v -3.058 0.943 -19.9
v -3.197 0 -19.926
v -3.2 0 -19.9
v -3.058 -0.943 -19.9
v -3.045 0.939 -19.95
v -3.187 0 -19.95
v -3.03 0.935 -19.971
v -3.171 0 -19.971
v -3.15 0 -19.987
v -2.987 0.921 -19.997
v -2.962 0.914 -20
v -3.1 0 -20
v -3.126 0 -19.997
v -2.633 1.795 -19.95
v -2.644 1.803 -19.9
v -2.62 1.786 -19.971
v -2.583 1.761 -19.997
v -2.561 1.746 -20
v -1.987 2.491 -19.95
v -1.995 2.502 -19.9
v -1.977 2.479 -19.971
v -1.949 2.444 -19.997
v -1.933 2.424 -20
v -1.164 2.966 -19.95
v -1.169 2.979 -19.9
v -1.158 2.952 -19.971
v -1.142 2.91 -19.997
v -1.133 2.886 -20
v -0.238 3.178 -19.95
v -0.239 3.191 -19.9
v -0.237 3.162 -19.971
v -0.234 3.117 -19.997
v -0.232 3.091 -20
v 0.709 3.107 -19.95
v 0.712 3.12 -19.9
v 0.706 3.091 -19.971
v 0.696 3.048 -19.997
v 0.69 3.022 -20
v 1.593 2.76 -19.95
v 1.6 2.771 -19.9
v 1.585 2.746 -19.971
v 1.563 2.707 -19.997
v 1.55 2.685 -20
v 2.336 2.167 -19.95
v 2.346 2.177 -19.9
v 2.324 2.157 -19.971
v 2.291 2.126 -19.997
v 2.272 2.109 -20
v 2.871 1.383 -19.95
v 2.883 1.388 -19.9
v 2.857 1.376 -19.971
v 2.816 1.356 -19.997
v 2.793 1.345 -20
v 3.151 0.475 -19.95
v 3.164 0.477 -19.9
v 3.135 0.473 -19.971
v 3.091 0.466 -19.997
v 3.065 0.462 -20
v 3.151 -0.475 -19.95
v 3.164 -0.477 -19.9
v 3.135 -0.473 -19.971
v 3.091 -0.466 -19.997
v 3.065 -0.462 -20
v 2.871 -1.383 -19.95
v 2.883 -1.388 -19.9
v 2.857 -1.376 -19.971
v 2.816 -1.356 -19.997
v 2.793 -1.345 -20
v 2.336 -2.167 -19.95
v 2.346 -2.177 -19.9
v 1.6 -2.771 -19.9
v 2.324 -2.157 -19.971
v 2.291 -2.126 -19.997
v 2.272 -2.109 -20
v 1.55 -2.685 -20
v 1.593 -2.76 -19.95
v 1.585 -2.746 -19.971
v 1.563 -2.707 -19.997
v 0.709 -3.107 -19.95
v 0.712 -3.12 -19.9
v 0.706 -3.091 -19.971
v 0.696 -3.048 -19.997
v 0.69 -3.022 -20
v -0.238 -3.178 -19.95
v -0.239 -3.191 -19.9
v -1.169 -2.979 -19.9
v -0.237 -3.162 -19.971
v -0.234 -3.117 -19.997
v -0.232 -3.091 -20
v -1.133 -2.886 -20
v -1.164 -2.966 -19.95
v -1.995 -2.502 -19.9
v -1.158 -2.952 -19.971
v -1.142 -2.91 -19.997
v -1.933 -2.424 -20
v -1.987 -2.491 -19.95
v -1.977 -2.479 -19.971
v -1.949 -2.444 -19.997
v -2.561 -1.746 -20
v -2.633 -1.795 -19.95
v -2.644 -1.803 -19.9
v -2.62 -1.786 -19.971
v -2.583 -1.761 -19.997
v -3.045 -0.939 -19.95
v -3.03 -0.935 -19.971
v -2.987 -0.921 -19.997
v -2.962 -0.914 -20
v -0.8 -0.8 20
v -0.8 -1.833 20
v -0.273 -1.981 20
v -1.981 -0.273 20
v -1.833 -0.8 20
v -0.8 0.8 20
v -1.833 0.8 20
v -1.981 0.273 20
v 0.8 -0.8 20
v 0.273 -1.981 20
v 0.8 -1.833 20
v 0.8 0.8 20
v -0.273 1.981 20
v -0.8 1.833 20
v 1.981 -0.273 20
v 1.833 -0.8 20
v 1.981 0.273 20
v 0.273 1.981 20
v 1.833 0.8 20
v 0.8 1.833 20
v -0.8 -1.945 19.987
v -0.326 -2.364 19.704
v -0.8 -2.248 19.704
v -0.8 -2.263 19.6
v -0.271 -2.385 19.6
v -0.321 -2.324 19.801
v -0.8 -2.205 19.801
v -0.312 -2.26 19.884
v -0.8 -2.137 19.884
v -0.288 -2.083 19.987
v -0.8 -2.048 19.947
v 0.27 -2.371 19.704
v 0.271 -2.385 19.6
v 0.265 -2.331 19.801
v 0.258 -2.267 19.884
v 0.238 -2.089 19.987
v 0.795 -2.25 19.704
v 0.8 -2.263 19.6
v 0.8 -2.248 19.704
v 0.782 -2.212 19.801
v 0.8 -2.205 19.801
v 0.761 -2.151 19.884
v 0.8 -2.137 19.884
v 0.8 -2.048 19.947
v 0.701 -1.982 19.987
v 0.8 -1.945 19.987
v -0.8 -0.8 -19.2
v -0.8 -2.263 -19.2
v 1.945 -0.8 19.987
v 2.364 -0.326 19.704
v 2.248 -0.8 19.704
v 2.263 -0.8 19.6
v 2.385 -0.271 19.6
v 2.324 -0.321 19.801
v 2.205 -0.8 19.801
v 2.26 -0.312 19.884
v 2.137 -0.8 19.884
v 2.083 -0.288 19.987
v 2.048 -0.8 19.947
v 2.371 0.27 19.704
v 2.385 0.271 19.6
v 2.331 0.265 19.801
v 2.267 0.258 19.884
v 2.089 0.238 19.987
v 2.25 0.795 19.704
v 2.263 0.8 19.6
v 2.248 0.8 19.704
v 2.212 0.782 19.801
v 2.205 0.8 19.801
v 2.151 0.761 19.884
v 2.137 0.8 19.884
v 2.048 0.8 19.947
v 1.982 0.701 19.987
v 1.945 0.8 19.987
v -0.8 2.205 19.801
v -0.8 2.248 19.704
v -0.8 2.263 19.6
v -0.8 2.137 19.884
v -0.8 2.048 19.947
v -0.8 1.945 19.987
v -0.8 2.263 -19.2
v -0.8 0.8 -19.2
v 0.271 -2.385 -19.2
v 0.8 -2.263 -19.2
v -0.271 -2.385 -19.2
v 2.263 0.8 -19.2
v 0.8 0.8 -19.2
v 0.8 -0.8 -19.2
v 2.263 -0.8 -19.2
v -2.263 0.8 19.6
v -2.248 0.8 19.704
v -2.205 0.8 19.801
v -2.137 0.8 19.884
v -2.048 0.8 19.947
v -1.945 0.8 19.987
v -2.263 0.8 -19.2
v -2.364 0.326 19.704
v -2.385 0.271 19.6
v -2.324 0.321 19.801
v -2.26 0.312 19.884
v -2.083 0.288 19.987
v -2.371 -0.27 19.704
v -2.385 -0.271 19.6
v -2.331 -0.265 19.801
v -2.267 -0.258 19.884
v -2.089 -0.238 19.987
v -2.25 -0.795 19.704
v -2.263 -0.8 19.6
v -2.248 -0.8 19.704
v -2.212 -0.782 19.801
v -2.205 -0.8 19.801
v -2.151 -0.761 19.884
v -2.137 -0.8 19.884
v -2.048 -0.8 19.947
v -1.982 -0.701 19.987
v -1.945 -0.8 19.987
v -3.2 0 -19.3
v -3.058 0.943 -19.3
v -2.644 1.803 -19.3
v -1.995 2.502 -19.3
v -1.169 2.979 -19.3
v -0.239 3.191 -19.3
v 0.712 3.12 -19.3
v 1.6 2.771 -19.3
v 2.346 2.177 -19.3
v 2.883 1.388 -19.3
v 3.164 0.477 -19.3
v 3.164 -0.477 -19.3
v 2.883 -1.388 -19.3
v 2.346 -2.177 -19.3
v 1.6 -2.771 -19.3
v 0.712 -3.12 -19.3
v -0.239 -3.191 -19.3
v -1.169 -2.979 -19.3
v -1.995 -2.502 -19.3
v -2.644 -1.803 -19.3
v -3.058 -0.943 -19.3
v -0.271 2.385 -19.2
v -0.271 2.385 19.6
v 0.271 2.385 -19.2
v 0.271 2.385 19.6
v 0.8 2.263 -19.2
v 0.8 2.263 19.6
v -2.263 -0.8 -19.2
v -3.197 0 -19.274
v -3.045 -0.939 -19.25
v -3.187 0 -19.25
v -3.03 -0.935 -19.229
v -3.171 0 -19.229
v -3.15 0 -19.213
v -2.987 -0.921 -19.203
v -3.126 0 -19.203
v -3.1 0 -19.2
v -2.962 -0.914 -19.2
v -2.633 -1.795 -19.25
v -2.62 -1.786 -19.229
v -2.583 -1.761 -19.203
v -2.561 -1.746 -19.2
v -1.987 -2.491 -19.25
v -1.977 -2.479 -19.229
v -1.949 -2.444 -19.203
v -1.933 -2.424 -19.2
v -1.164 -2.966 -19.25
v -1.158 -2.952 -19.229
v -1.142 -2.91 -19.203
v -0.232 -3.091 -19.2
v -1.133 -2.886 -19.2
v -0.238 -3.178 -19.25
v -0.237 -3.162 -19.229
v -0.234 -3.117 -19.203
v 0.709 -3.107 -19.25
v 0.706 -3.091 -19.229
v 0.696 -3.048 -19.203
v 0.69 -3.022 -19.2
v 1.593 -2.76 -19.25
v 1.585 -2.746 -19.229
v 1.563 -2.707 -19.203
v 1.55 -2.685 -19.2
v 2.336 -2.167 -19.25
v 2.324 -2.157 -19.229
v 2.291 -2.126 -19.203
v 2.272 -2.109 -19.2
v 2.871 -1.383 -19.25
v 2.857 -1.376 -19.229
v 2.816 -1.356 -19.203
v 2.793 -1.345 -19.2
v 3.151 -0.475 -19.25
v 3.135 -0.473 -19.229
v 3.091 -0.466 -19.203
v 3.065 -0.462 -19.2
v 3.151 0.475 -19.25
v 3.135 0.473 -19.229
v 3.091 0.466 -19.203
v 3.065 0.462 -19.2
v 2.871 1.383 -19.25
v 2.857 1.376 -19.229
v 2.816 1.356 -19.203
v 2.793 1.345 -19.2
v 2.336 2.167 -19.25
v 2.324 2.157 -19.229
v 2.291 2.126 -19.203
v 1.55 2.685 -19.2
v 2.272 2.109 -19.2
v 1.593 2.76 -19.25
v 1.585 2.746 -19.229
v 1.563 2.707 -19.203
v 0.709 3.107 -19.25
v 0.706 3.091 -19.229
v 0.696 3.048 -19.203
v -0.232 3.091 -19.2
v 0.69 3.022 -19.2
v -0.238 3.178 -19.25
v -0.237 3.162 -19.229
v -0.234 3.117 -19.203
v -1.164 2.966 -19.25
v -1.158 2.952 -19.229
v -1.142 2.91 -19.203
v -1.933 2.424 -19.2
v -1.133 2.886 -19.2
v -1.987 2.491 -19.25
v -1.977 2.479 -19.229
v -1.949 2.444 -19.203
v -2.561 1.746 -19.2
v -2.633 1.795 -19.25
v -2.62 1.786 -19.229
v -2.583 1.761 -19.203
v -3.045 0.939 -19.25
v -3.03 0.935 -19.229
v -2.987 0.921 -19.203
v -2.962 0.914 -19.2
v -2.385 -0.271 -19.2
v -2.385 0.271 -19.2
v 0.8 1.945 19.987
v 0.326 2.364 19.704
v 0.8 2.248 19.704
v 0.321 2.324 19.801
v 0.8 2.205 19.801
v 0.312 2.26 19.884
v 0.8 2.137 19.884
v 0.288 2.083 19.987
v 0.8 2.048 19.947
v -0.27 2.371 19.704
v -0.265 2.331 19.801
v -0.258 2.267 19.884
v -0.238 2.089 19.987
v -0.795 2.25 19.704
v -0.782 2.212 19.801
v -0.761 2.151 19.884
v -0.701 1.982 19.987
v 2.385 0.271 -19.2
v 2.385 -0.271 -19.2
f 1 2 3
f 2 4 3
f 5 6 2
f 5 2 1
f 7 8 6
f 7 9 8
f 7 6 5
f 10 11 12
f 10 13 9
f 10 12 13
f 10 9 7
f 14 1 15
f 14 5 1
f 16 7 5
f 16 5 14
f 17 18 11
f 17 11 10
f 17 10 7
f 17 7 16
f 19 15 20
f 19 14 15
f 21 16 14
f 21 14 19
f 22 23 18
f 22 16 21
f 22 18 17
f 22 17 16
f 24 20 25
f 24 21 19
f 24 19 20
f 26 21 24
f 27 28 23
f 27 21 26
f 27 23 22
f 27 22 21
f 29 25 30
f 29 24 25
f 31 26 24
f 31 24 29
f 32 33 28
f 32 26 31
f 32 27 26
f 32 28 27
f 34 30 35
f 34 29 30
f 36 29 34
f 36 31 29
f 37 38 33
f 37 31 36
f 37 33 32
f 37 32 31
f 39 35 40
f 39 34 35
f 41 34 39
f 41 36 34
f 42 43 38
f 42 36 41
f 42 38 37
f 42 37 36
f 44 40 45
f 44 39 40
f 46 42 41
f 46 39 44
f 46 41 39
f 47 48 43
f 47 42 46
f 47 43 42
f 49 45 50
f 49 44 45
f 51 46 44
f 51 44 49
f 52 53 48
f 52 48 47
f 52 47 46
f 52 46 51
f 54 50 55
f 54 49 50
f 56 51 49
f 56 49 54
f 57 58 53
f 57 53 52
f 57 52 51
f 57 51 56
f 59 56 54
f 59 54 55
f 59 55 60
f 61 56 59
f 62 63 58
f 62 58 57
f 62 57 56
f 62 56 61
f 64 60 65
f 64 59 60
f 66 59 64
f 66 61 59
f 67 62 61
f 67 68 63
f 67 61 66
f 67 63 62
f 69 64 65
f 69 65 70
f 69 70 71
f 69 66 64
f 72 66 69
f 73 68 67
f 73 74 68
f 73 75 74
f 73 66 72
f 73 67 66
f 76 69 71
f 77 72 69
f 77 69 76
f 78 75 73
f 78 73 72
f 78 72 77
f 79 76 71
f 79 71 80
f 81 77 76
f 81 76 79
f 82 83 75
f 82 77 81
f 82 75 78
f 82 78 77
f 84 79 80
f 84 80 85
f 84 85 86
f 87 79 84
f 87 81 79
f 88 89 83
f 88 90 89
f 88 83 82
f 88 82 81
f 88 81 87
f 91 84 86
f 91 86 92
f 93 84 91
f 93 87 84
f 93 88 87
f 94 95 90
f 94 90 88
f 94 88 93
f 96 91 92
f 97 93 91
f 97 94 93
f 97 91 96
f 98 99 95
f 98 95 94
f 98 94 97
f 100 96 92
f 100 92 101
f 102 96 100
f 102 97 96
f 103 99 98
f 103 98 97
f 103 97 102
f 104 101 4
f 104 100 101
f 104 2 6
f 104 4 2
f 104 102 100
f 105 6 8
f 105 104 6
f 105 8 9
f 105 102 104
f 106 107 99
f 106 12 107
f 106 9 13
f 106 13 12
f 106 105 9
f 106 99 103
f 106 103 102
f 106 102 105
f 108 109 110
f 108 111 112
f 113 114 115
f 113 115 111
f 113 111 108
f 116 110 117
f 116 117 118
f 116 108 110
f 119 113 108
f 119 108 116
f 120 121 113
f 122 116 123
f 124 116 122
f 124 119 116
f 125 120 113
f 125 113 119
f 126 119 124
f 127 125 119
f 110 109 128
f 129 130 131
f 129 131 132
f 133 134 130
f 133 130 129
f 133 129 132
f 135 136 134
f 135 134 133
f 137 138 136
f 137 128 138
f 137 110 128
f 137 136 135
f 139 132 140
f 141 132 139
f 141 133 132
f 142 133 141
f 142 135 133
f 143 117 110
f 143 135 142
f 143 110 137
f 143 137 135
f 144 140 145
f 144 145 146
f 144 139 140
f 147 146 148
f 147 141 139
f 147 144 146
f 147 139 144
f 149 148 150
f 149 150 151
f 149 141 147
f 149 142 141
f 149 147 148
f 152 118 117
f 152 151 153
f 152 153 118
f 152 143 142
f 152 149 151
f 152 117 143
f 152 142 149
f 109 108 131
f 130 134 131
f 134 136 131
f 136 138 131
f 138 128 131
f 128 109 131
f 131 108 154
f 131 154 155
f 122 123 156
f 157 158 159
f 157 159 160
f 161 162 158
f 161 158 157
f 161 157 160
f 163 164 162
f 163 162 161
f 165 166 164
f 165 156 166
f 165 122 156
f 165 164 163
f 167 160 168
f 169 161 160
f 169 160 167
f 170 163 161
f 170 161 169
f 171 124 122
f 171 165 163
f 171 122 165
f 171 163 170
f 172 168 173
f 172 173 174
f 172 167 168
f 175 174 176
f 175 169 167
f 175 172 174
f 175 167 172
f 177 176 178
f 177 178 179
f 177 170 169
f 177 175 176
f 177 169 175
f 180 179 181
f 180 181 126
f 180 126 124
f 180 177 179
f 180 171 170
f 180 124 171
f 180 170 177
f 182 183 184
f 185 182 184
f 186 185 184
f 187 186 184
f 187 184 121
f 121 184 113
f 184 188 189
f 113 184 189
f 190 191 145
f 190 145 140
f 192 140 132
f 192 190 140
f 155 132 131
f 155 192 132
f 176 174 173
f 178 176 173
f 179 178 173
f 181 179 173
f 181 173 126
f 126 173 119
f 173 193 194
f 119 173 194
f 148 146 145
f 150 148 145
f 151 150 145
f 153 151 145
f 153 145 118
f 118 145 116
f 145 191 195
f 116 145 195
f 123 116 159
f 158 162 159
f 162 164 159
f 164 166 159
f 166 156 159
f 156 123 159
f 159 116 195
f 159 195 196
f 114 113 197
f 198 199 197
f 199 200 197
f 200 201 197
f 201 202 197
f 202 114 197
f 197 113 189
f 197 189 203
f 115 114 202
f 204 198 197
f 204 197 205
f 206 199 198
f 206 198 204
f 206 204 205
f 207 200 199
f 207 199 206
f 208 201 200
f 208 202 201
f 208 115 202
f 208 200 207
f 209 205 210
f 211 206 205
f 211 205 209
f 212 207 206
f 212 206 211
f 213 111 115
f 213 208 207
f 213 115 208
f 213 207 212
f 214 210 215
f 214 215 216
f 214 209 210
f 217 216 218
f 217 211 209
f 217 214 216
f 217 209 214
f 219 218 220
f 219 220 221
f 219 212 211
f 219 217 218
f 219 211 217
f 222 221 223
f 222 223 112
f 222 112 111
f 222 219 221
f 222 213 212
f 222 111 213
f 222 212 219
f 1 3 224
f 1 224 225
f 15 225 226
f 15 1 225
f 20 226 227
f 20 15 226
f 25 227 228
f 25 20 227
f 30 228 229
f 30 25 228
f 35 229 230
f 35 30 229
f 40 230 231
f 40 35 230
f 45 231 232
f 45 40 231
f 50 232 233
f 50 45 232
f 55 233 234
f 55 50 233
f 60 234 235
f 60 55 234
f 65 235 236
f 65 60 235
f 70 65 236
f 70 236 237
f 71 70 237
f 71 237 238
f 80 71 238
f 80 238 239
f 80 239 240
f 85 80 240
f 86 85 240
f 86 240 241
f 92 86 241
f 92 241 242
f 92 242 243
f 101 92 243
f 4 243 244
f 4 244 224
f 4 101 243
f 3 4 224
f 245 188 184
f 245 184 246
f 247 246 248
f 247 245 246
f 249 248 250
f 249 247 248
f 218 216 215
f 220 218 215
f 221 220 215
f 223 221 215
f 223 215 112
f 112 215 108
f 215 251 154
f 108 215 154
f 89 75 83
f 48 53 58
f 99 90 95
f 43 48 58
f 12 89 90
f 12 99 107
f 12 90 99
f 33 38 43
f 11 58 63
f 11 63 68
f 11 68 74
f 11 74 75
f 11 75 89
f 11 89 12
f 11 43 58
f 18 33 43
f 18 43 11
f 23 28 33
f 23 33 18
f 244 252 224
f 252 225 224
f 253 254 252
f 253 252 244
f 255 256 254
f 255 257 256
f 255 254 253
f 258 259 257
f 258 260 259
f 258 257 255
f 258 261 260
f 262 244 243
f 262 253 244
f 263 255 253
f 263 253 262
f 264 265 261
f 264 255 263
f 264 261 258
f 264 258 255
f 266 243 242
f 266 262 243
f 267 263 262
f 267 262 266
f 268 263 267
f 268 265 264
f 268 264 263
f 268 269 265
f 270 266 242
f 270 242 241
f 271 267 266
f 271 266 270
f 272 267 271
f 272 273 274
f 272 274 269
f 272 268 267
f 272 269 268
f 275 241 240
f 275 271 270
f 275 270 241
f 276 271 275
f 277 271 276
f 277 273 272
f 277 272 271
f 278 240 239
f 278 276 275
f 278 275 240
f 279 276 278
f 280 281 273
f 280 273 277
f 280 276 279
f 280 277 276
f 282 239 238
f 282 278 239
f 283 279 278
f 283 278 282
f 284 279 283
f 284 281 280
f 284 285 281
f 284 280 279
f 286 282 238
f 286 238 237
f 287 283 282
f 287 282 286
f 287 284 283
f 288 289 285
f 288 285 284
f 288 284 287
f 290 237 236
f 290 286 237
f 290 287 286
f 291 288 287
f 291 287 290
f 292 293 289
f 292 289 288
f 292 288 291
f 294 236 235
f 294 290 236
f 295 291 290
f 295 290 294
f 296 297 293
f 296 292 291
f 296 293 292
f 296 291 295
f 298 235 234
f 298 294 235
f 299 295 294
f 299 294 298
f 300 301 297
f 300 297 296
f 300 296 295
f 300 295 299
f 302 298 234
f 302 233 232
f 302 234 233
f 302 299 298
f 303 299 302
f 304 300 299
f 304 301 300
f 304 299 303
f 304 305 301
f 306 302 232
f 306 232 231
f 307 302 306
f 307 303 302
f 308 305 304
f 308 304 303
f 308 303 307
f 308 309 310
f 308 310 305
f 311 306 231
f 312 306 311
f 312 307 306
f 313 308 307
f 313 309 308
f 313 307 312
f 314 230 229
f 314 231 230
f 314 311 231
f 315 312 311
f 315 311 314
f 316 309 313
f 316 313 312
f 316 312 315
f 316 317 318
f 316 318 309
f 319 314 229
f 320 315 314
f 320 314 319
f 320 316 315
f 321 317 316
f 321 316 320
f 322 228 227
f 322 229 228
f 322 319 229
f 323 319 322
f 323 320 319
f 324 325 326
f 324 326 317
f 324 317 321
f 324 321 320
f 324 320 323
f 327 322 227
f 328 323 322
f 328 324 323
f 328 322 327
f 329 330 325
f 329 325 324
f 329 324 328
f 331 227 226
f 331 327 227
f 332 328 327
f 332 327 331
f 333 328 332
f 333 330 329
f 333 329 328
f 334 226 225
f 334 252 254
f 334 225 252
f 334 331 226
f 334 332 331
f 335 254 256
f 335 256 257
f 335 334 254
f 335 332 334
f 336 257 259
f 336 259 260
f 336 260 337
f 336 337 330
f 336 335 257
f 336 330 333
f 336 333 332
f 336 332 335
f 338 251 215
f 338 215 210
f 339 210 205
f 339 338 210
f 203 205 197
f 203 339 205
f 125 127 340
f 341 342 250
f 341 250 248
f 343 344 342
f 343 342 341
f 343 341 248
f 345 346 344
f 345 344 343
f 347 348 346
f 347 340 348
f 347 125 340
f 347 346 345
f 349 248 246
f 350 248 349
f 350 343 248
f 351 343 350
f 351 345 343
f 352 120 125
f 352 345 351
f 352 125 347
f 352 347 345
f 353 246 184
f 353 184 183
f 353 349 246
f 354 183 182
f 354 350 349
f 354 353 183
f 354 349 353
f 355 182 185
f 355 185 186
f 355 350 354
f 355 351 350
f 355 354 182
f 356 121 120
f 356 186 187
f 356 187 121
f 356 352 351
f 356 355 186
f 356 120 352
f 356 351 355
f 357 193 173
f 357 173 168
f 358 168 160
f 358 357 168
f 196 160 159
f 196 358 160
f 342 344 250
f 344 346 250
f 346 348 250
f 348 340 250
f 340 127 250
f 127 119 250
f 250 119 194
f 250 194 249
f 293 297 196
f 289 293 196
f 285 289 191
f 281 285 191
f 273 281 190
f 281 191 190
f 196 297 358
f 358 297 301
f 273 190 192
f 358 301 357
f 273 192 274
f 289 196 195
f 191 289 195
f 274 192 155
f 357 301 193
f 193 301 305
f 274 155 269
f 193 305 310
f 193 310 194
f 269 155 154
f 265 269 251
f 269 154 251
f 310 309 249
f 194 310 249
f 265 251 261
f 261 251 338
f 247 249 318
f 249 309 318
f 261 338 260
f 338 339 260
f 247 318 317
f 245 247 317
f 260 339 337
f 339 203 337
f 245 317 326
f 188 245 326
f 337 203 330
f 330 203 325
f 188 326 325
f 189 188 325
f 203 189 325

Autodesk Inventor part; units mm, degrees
ref_plane "YZ Plane" through (0, 0, 0) normal (1, 0, 0) x (0, 1, 0)
ref_plane "XZ Plane" through (0, 0, 0) normal (0, 1, 0) x (-1, 0, 0)
ref_plane "XY Plane" through (0, 0, 0) normal (0, 0, 1) x (1, 0, 0)
sketch "Sketch1" plane through (0, 0, 0) normal (0, 0, 1) x (1, 0, 0)
  circle A0 centre (0, 0) radius 2.4 construction
  line L0 (-0.8, 2.2627) -> (-0.8, 0.8)
  line L1 (-0.8, 0.8) -> (-2.2627, 0.8)
  line L2 (-2.2627, -0.8) -> (-0.8, -0.8)
  line L3 (-0.8, -0.8) -> (-0.8, -2.2627)
  line L4 (0.8, -2.2627) -> (0.8, -0.8)
  line L5 (0.8, -0.8) -> (2.2627, -0.8)
  line L6 (2.2627, 0.8) -> (0.8, 0.8)
  line L7 (0.8, 0.8) -> (0.8, 2.2627)
  arc A1 (0.8, 2.2627) -> (-0.8, 2.2627) centre (0, 0) ccw
  arc A2 (-2.2627, 0.8) -> (-2.2627, -0.8) centre (0, 0) ccw
  arc A3 (-0.8, -2.2627) -> (0.8, -2.2627) centre (0, 0) ccw
  arc A4 (2.2627, -0.8) -> (2.2627, 0.8) centre (0, 0) ccw
  dimension "d0" = 4.8
  dimension "d1" = 1.6
extrude "Extrusion1" add sketch "Sketch1" along normal mid plane 40
sketch "Sketch2" plane through (0, 0, -20) normal (0, 0, -1) x (-1, 0, 0)
  line L0 (0.8, 0.8) -> (0.8, 2.2627) projected
  arc A0 (0.8, 2.2627) -> (-0.8, 2.2627) centre (0, 0) ccw projected
  line L1 (-0.8, 2.2627) -> (-0.8, 0.8) projected
  line L2 (-0.8, 0.8) -> (-2.2627, 0.8) projected
  arc A1 (-2.2627, 0.8) -> (-2.2627, -0.8) centre (0, 0) ccw projected
  line L3 (-2.2627, -0.8) -> (-0.8, -0.8) projected
  line L4 (-0.8, -0.8) -> (-0.8, -2.2627) projected
  arc A2 (-0.8, -2.2627) -> (0.8, -2.2627) centre (0, 0) ccw projected
  line L5 (0.8, -2.2627) -> (0.8, -0.8) projected
  line L6 (0.8, -0.8) -> (2.2627, -0.8) projected
  arc A3 (2.2627, -0.8) -> (2.2627, 0.8) centre (0, 0) ccw projected
  line L7 (2.2627, 0.8) -> (0.8, 0.8) projected
  circle A4 centre (0, 0) radius 3.2
  dimension "d7" = 6.4
extrude "Extrusion2" add sketch "Sketch2" against normal blind 0.8
fillet "Fillet1" radius 0.4 4 edges at (0, 2.4, 20) (-2.4, 0, 20) (0, -2.4, 20) (2.4, 0, 20)
fillet "Fillet1" radius 0.1 2 edges at (3.2, 0, -19.2) (3.2, 0, -20)
equation "\"d0\" = kd"
equation "\"d1\" = axlet"
equation "\"d2\" = 5 * lu"
equation "\"d7\" = tsd"
equation "\"d8\" = tsl"
equation "\"d4\" = tf"
equation "\"d10\" = lf"
equation "\"kd\" = 4.8"
equation "\"axlet\" = 1.6"
equation "\"lu\" = 8"
equation "\"tsd\" = 6.4"
equation "\"tsl\" = 0.8"
equation "\"tf\" = 0.4"
equation "\"lf\" = 0.1"
properties part number "15462-ReddishBrown" material "ABS Plastic"
